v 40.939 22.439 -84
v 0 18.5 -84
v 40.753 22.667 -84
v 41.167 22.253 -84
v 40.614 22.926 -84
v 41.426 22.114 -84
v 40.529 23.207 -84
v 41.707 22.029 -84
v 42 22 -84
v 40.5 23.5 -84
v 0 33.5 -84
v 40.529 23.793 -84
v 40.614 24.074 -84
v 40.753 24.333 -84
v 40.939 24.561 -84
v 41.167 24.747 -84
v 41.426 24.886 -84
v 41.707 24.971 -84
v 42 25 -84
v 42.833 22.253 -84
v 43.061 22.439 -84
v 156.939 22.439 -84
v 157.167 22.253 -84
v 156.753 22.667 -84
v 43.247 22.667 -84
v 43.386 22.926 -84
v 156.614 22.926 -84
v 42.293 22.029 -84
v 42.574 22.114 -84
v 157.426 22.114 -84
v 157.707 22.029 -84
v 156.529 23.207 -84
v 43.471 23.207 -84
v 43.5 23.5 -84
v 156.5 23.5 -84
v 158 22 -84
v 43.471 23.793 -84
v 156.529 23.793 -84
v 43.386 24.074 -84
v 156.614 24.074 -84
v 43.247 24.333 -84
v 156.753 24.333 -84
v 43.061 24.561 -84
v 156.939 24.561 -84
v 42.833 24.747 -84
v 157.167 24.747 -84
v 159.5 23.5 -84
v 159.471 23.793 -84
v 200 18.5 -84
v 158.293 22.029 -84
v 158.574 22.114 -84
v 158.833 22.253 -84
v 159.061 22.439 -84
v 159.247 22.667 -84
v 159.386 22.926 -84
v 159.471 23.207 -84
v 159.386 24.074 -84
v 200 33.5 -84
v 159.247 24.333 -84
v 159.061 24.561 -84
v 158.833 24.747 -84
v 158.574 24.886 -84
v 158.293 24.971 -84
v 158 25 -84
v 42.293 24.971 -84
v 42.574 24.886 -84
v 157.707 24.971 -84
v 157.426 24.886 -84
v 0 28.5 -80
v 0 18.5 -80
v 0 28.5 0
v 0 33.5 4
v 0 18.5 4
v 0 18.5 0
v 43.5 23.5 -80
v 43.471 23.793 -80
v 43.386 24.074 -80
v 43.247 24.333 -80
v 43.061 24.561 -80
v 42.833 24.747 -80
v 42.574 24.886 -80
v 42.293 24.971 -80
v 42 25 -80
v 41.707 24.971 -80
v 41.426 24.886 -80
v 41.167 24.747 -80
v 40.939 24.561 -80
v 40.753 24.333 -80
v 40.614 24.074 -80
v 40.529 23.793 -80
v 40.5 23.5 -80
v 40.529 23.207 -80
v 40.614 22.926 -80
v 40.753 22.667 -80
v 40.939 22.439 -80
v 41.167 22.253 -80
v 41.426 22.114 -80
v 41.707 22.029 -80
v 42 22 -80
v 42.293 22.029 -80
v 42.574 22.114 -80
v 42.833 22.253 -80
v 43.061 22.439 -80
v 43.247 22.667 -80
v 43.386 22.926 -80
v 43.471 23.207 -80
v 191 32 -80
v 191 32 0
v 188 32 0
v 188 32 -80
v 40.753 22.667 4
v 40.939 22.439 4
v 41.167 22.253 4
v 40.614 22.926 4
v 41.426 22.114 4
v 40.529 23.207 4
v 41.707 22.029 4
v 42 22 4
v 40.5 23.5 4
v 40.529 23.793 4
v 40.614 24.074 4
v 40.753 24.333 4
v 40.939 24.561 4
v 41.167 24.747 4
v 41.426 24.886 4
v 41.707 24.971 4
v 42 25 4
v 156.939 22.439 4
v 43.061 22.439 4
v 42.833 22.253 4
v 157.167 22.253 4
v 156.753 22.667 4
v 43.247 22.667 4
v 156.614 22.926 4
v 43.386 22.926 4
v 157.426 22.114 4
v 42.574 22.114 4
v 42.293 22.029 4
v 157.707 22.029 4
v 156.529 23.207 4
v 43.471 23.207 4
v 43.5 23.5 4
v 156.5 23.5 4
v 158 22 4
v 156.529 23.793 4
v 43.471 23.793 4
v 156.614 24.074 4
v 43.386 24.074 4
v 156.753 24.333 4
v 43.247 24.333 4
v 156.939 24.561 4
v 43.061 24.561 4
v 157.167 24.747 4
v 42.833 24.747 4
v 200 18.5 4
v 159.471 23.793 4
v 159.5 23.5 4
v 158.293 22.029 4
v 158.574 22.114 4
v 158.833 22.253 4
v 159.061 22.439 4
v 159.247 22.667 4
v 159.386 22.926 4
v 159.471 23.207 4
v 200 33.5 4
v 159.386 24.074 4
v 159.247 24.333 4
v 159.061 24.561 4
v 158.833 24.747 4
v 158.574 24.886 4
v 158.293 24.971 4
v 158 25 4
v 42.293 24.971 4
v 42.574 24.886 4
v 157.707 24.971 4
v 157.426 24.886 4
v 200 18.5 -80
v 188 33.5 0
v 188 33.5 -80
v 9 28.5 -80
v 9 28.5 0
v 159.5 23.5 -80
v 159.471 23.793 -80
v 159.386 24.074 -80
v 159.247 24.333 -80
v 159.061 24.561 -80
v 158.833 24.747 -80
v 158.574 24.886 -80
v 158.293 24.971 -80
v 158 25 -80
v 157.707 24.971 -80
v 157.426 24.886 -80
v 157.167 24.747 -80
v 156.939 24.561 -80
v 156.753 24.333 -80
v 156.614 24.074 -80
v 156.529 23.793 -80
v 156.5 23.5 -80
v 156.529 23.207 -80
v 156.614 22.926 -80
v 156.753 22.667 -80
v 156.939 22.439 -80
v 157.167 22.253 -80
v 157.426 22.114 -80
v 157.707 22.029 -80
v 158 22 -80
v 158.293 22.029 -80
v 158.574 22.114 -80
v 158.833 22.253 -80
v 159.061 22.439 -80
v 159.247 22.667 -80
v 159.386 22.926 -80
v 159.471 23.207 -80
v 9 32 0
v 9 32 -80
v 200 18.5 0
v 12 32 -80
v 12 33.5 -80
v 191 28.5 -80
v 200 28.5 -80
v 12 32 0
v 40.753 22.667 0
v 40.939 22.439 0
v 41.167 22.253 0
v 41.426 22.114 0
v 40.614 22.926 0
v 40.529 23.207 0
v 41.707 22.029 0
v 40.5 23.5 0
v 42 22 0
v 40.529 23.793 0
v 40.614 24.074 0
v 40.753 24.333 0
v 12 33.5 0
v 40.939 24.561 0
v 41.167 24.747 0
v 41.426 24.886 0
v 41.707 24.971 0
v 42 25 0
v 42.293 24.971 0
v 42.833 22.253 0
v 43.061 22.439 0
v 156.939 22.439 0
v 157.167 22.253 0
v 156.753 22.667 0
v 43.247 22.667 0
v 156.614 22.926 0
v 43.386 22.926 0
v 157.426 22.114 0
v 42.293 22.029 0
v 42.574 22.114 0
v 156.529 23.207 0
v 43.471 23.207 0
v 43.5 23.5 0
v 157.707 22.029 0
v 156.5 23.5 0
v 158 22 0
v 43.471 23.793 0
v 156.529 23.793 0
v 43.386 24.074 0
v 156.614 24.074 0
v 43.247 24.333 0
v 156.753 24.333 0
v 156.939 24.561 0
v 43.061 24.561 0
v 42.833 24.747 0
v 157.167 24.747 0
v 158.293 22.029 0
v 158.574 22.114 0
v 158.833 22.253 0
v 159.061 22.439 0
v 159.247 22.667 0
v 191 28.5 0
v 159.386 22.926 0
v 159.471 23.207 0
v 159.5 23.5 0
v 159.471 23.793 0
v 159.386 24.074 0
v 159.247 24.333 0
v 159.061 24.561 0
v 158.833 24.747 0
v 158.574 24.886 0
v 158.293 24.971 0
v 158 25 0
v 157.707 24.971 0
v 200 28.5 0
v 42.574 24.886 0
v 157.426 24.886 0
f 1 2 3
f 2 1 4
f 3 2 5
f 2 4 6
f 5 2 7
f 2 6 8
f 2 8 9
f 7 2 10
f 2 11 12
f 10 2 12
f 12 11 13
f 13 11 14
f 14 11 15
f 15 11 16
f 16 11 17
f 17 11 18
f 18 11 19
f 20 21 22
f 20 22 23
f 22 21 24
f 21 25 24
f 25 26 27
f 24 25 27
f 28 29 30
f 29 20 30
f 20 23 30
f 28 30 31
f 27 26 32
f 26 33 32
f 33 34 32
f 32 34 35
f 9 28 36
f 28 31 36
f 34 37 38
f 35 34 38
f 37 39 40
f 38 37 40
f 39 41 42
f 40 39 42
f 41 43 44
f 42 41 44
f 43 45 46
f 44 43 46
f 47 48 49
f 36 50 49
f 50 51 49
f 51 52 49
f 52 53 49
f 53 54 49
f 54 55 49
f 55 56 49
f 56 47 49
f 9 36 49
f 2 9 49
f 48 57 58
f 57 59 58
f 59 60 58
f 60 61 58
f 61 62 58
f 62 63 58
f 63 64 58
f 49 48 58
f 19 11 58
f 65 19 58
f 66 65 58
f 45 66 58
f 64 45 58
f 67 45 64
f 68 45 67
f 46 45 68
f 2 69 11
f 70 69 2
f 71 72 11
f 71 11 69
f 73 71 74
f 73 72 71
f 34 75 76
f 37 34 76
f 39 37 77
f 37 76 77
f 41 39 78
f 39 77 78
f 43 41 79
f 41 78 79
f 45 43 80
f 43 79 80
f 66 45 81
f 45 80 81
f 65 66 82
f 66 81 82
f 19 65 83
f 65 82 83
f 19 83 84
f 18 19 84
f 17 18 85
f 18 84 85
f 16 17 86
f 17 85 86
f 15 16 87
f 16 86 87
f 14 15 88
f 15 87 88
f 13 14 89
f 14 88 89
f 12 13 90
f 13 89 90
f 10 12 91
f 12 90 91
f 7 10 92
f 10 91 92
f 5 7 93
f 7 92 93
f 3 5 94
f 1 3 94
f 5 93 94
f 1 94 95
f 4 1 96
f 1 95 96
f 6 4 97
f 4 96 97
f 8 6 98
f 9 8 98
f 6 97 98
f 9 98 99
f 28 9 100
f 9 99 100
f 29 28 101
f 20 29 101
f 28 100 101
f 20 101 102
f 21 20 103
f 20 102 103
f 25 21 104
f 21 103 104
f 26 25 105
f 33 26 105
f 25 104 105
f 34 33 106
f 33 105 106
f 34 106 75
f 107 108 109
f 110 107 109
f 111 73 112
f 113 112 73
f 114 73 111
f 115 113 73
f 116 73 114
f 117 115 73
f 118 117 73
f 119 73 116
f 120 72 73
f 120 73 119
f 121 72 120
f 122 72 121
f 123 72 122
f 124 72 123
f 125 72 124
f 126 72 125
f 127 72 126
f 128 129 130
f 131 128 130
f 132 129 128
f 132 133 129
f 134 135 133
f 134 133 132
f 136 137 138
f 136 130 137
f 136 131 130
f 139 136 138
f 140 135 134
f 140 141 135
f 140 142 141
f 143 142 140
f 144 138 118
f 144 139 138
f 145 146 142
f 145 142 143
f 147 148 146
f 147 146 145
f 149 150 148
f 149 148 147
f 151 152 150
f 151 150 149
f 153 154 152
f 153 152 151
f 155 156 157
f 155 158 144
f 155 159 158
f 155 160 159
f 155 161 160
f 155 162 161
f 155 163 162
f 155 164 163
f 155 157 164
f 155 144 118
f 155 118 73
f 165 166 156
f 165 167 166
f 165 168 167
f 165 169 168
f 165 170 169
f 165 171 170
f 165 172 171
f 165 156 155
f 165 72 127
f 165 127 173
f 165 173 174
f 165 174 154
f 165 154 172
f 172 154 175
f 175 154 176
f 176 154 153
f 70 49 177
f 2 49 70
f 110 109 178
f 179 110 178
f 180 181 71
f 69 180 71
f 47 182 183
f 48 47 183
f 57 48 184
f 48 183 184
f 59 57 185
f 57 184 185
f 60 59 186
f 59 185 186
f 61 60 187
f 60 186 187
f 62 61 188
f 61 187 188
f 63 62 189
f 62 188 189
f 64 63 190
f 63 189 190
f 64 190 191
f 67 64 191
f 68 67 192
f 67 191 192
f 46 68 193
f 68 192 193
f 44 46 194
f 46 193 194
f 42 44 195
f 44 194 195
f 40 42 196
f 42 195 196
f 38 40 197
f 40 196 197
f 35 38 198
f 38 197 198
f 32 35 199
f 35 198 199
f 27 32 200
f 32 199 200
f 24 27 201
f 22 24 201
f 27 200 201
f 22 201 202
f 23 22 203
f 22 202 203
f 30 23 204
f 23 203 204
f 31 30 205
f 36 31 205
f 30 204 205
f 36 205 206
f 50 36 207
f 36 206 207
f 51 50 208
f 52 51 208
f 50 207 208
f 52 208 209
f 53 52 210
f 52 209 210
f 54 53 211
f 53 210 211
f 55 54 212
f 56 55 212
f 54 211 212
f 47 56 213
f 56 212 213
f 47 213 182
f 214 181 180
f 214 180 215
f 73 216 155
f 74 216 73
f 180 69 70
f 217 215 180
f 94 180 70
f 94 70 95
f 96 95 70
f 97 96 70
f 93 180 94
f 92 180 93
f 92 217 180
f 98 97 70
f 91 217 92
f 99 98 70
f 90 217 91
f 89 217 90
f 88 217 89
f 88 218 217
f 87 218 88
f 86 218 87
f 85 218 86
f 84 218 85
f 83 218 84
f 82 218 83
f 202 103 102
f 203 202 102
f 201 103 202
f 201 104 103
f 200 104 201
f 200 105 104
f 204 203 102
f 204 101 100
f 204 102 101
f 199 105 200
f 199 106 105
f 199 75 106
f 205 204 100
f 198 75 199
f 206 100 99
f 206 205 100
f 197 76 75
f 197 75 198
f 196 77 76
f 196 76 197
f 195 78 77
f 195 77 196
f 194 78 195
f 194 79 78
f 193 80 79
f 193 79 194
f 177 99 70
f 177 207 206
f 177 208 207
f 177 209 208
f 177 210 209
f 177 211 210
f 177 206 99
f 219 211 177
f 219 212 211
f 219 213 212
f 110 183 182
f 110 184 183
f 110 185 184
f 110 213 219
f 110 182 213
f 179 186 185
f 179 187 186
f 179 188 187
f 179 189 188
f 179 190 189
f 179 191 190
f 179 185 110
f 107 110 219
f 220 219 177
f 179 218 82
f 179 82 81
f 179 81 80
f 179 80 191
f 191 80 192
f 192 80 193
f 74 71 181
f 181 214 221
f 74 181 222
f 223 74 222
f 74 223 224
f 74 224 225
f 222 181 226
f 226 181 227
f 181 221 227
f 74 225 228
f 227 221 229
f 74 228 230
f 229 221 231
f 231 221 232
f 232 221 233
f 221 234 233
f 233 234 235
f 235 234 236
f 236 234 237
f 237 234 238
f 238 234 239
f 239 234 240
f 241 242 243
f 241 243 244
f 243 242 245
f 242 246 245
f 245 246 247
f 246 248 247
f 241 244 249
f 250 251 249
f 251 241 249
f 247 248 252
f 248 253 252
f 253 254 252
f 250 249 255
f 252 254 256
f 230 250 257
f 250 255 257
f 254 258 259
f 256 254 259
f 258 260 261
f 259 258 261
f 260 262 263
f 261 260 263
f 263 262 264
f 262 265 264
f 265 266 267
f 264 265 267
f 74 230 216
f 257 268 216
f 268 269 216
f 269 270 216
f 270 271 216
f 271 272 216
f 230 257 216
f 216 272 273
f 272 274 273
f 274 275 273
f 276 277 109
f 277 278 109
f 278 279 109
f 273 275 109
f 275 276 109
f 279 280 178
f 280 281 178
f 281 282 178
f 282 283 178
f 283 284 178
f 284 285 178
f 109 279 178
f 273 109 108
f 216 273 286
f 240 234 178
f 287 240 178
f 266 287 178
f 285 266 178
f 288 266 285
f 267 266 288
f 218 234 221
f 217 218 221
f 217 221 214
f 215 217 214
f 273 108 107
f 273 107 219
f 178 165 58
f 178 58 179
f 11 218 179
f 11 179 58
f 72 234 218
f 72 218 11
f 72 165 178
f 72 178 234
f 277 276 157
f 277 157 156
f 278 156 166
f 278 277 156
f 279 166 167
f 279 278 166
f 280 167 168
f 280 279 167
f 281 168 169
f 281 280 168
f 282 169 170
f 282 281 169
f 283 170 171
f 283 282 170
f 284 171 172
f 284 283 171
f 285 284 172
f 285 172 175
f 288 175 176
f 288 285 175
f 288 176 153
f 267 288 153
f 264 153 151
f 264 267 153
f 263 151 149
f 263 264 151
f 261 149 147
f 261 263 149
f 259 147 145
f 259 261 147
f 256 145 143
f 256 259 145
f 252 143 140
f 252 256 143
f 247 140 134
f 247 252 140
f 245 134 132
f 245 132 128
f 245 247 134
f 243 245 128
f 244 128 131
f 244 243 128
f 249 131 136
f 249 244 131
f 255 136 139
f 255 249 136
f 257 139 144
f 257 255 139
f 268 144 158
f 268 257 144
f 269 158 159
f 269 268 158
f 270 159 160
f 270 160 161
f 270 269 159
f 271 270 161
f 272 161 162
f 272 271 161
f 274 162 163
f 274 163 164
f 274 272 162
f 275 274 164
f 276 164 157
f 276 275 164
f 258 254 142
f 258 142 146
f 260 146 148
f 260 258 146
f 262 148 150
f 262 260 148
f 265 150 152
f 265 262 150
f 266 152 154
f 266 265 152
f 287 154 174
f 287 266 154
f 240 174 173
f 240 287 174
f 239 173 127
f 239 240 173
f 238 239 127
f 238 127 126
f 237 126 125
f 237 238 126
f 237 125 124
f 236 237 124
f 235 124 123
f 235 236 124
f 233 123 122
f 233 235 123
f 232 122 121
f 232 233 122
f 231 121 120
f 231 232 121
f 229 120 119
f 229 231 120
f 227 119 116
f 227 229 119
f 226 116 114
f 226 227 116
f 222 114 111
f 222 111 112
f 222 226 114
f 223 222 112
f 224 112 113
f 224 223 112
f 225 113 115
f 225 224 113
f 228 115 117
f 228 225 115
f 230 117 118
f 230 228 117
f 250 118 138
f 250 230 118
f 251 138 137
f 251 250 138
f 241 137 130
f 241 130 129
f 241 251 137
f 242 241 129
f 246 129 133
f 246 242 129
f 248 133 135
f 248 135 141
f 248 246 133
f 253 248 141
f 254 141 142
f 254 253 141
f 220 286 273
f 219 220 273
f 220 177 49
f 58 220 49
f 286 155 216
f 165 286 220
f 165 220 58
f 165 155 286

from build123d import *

# Parameters (mm, degrees)
SKETCH1_R                 = 1.5
MOUNTING_PLATE_DEPTH      = 4
RAILS_DEPTH               = 80
SKETCH1_4_W               = 182
SKETCH1_4_H               = 5
MOUNTING_PLATE_2_DEPTH    = 4
SKETCH4_W                 = 200
SKETCH4_H                 = 18.5
UNNECESSARY_PLASTIC_DEPTH = 222.057119315


with BuildPart() as part:
    # Sketch1 → Mounting Plate (new body)
    with BuildSketch(Plane.XY):
        Polygon((191, 28.5), (9, 28.5), (9, 33.5), (0, 33.5), (0, 0), (200, 0), (200, 33.5), (191, 33.5), align=None)
        with Locations((158, 23.5)):
            Circle(SKETCH1_R, mode=Mode.SUBTRACT)
        with Locations((42, 23.5)):
            Circle(SKETCH1_R, mode=Mode.SUBTRACT)
    mounting_plate = extrude(amount=MOUNTING_PLATE_DEPTH)

    # Sketch3 → Rails (add)
    with BuildSketch(Plane(origin=(0, 0, 0), x_dir=(-1, 0, 0), z_dir=(0, 0, -1))):
        Polygon((0, 28.5), (0, 33.5), (-12, 33.5), (-12, 32), (-9, 32), (-9, 28.5), align=None)
        Polygon((-188, 32), (-188, 33.5), (-200, 33.5), (-200, 28.5), (-191, 28.5), (-191, 32), align=None)
    extrude(amount=RAILS_DEPTH)

    # Sketch1<4> → Mounting Plate 2 (add)
    with BuildSketch(Plane.XY):
        with Locations((100, 31)):
            Rectangle(SKETCH1_4_W, SKETCH1_4_H)
    mounting_plate_2 = extrude(amount=MOUNTING_PLATE_2_DEPTH)

    # Mirror1: Mounting Plate, Mounting Plate 2 across plane
    add(mounting_plate.mirror(Plane.XY.offset(-40)))
    add(mounting_plate_2.mirror(Plane.XY.offset(-40)))

    # Sketch4 → Unnecessary Plastic (cut, through all)
    with BuildSketch(Plane(origin=(0, 0, -84), x_dir=(-1, 0, 0), z_dir=(0, 0, -1))):
        with Locations((-100, 9.25)):
            Rectangle(SKETCH4_W, SKETCH4_H)
    extrude(amount=-UNNECESSARY_PLASTIC_DEPTH, mode=Mode.SUBTRACT)


solid = part.part
